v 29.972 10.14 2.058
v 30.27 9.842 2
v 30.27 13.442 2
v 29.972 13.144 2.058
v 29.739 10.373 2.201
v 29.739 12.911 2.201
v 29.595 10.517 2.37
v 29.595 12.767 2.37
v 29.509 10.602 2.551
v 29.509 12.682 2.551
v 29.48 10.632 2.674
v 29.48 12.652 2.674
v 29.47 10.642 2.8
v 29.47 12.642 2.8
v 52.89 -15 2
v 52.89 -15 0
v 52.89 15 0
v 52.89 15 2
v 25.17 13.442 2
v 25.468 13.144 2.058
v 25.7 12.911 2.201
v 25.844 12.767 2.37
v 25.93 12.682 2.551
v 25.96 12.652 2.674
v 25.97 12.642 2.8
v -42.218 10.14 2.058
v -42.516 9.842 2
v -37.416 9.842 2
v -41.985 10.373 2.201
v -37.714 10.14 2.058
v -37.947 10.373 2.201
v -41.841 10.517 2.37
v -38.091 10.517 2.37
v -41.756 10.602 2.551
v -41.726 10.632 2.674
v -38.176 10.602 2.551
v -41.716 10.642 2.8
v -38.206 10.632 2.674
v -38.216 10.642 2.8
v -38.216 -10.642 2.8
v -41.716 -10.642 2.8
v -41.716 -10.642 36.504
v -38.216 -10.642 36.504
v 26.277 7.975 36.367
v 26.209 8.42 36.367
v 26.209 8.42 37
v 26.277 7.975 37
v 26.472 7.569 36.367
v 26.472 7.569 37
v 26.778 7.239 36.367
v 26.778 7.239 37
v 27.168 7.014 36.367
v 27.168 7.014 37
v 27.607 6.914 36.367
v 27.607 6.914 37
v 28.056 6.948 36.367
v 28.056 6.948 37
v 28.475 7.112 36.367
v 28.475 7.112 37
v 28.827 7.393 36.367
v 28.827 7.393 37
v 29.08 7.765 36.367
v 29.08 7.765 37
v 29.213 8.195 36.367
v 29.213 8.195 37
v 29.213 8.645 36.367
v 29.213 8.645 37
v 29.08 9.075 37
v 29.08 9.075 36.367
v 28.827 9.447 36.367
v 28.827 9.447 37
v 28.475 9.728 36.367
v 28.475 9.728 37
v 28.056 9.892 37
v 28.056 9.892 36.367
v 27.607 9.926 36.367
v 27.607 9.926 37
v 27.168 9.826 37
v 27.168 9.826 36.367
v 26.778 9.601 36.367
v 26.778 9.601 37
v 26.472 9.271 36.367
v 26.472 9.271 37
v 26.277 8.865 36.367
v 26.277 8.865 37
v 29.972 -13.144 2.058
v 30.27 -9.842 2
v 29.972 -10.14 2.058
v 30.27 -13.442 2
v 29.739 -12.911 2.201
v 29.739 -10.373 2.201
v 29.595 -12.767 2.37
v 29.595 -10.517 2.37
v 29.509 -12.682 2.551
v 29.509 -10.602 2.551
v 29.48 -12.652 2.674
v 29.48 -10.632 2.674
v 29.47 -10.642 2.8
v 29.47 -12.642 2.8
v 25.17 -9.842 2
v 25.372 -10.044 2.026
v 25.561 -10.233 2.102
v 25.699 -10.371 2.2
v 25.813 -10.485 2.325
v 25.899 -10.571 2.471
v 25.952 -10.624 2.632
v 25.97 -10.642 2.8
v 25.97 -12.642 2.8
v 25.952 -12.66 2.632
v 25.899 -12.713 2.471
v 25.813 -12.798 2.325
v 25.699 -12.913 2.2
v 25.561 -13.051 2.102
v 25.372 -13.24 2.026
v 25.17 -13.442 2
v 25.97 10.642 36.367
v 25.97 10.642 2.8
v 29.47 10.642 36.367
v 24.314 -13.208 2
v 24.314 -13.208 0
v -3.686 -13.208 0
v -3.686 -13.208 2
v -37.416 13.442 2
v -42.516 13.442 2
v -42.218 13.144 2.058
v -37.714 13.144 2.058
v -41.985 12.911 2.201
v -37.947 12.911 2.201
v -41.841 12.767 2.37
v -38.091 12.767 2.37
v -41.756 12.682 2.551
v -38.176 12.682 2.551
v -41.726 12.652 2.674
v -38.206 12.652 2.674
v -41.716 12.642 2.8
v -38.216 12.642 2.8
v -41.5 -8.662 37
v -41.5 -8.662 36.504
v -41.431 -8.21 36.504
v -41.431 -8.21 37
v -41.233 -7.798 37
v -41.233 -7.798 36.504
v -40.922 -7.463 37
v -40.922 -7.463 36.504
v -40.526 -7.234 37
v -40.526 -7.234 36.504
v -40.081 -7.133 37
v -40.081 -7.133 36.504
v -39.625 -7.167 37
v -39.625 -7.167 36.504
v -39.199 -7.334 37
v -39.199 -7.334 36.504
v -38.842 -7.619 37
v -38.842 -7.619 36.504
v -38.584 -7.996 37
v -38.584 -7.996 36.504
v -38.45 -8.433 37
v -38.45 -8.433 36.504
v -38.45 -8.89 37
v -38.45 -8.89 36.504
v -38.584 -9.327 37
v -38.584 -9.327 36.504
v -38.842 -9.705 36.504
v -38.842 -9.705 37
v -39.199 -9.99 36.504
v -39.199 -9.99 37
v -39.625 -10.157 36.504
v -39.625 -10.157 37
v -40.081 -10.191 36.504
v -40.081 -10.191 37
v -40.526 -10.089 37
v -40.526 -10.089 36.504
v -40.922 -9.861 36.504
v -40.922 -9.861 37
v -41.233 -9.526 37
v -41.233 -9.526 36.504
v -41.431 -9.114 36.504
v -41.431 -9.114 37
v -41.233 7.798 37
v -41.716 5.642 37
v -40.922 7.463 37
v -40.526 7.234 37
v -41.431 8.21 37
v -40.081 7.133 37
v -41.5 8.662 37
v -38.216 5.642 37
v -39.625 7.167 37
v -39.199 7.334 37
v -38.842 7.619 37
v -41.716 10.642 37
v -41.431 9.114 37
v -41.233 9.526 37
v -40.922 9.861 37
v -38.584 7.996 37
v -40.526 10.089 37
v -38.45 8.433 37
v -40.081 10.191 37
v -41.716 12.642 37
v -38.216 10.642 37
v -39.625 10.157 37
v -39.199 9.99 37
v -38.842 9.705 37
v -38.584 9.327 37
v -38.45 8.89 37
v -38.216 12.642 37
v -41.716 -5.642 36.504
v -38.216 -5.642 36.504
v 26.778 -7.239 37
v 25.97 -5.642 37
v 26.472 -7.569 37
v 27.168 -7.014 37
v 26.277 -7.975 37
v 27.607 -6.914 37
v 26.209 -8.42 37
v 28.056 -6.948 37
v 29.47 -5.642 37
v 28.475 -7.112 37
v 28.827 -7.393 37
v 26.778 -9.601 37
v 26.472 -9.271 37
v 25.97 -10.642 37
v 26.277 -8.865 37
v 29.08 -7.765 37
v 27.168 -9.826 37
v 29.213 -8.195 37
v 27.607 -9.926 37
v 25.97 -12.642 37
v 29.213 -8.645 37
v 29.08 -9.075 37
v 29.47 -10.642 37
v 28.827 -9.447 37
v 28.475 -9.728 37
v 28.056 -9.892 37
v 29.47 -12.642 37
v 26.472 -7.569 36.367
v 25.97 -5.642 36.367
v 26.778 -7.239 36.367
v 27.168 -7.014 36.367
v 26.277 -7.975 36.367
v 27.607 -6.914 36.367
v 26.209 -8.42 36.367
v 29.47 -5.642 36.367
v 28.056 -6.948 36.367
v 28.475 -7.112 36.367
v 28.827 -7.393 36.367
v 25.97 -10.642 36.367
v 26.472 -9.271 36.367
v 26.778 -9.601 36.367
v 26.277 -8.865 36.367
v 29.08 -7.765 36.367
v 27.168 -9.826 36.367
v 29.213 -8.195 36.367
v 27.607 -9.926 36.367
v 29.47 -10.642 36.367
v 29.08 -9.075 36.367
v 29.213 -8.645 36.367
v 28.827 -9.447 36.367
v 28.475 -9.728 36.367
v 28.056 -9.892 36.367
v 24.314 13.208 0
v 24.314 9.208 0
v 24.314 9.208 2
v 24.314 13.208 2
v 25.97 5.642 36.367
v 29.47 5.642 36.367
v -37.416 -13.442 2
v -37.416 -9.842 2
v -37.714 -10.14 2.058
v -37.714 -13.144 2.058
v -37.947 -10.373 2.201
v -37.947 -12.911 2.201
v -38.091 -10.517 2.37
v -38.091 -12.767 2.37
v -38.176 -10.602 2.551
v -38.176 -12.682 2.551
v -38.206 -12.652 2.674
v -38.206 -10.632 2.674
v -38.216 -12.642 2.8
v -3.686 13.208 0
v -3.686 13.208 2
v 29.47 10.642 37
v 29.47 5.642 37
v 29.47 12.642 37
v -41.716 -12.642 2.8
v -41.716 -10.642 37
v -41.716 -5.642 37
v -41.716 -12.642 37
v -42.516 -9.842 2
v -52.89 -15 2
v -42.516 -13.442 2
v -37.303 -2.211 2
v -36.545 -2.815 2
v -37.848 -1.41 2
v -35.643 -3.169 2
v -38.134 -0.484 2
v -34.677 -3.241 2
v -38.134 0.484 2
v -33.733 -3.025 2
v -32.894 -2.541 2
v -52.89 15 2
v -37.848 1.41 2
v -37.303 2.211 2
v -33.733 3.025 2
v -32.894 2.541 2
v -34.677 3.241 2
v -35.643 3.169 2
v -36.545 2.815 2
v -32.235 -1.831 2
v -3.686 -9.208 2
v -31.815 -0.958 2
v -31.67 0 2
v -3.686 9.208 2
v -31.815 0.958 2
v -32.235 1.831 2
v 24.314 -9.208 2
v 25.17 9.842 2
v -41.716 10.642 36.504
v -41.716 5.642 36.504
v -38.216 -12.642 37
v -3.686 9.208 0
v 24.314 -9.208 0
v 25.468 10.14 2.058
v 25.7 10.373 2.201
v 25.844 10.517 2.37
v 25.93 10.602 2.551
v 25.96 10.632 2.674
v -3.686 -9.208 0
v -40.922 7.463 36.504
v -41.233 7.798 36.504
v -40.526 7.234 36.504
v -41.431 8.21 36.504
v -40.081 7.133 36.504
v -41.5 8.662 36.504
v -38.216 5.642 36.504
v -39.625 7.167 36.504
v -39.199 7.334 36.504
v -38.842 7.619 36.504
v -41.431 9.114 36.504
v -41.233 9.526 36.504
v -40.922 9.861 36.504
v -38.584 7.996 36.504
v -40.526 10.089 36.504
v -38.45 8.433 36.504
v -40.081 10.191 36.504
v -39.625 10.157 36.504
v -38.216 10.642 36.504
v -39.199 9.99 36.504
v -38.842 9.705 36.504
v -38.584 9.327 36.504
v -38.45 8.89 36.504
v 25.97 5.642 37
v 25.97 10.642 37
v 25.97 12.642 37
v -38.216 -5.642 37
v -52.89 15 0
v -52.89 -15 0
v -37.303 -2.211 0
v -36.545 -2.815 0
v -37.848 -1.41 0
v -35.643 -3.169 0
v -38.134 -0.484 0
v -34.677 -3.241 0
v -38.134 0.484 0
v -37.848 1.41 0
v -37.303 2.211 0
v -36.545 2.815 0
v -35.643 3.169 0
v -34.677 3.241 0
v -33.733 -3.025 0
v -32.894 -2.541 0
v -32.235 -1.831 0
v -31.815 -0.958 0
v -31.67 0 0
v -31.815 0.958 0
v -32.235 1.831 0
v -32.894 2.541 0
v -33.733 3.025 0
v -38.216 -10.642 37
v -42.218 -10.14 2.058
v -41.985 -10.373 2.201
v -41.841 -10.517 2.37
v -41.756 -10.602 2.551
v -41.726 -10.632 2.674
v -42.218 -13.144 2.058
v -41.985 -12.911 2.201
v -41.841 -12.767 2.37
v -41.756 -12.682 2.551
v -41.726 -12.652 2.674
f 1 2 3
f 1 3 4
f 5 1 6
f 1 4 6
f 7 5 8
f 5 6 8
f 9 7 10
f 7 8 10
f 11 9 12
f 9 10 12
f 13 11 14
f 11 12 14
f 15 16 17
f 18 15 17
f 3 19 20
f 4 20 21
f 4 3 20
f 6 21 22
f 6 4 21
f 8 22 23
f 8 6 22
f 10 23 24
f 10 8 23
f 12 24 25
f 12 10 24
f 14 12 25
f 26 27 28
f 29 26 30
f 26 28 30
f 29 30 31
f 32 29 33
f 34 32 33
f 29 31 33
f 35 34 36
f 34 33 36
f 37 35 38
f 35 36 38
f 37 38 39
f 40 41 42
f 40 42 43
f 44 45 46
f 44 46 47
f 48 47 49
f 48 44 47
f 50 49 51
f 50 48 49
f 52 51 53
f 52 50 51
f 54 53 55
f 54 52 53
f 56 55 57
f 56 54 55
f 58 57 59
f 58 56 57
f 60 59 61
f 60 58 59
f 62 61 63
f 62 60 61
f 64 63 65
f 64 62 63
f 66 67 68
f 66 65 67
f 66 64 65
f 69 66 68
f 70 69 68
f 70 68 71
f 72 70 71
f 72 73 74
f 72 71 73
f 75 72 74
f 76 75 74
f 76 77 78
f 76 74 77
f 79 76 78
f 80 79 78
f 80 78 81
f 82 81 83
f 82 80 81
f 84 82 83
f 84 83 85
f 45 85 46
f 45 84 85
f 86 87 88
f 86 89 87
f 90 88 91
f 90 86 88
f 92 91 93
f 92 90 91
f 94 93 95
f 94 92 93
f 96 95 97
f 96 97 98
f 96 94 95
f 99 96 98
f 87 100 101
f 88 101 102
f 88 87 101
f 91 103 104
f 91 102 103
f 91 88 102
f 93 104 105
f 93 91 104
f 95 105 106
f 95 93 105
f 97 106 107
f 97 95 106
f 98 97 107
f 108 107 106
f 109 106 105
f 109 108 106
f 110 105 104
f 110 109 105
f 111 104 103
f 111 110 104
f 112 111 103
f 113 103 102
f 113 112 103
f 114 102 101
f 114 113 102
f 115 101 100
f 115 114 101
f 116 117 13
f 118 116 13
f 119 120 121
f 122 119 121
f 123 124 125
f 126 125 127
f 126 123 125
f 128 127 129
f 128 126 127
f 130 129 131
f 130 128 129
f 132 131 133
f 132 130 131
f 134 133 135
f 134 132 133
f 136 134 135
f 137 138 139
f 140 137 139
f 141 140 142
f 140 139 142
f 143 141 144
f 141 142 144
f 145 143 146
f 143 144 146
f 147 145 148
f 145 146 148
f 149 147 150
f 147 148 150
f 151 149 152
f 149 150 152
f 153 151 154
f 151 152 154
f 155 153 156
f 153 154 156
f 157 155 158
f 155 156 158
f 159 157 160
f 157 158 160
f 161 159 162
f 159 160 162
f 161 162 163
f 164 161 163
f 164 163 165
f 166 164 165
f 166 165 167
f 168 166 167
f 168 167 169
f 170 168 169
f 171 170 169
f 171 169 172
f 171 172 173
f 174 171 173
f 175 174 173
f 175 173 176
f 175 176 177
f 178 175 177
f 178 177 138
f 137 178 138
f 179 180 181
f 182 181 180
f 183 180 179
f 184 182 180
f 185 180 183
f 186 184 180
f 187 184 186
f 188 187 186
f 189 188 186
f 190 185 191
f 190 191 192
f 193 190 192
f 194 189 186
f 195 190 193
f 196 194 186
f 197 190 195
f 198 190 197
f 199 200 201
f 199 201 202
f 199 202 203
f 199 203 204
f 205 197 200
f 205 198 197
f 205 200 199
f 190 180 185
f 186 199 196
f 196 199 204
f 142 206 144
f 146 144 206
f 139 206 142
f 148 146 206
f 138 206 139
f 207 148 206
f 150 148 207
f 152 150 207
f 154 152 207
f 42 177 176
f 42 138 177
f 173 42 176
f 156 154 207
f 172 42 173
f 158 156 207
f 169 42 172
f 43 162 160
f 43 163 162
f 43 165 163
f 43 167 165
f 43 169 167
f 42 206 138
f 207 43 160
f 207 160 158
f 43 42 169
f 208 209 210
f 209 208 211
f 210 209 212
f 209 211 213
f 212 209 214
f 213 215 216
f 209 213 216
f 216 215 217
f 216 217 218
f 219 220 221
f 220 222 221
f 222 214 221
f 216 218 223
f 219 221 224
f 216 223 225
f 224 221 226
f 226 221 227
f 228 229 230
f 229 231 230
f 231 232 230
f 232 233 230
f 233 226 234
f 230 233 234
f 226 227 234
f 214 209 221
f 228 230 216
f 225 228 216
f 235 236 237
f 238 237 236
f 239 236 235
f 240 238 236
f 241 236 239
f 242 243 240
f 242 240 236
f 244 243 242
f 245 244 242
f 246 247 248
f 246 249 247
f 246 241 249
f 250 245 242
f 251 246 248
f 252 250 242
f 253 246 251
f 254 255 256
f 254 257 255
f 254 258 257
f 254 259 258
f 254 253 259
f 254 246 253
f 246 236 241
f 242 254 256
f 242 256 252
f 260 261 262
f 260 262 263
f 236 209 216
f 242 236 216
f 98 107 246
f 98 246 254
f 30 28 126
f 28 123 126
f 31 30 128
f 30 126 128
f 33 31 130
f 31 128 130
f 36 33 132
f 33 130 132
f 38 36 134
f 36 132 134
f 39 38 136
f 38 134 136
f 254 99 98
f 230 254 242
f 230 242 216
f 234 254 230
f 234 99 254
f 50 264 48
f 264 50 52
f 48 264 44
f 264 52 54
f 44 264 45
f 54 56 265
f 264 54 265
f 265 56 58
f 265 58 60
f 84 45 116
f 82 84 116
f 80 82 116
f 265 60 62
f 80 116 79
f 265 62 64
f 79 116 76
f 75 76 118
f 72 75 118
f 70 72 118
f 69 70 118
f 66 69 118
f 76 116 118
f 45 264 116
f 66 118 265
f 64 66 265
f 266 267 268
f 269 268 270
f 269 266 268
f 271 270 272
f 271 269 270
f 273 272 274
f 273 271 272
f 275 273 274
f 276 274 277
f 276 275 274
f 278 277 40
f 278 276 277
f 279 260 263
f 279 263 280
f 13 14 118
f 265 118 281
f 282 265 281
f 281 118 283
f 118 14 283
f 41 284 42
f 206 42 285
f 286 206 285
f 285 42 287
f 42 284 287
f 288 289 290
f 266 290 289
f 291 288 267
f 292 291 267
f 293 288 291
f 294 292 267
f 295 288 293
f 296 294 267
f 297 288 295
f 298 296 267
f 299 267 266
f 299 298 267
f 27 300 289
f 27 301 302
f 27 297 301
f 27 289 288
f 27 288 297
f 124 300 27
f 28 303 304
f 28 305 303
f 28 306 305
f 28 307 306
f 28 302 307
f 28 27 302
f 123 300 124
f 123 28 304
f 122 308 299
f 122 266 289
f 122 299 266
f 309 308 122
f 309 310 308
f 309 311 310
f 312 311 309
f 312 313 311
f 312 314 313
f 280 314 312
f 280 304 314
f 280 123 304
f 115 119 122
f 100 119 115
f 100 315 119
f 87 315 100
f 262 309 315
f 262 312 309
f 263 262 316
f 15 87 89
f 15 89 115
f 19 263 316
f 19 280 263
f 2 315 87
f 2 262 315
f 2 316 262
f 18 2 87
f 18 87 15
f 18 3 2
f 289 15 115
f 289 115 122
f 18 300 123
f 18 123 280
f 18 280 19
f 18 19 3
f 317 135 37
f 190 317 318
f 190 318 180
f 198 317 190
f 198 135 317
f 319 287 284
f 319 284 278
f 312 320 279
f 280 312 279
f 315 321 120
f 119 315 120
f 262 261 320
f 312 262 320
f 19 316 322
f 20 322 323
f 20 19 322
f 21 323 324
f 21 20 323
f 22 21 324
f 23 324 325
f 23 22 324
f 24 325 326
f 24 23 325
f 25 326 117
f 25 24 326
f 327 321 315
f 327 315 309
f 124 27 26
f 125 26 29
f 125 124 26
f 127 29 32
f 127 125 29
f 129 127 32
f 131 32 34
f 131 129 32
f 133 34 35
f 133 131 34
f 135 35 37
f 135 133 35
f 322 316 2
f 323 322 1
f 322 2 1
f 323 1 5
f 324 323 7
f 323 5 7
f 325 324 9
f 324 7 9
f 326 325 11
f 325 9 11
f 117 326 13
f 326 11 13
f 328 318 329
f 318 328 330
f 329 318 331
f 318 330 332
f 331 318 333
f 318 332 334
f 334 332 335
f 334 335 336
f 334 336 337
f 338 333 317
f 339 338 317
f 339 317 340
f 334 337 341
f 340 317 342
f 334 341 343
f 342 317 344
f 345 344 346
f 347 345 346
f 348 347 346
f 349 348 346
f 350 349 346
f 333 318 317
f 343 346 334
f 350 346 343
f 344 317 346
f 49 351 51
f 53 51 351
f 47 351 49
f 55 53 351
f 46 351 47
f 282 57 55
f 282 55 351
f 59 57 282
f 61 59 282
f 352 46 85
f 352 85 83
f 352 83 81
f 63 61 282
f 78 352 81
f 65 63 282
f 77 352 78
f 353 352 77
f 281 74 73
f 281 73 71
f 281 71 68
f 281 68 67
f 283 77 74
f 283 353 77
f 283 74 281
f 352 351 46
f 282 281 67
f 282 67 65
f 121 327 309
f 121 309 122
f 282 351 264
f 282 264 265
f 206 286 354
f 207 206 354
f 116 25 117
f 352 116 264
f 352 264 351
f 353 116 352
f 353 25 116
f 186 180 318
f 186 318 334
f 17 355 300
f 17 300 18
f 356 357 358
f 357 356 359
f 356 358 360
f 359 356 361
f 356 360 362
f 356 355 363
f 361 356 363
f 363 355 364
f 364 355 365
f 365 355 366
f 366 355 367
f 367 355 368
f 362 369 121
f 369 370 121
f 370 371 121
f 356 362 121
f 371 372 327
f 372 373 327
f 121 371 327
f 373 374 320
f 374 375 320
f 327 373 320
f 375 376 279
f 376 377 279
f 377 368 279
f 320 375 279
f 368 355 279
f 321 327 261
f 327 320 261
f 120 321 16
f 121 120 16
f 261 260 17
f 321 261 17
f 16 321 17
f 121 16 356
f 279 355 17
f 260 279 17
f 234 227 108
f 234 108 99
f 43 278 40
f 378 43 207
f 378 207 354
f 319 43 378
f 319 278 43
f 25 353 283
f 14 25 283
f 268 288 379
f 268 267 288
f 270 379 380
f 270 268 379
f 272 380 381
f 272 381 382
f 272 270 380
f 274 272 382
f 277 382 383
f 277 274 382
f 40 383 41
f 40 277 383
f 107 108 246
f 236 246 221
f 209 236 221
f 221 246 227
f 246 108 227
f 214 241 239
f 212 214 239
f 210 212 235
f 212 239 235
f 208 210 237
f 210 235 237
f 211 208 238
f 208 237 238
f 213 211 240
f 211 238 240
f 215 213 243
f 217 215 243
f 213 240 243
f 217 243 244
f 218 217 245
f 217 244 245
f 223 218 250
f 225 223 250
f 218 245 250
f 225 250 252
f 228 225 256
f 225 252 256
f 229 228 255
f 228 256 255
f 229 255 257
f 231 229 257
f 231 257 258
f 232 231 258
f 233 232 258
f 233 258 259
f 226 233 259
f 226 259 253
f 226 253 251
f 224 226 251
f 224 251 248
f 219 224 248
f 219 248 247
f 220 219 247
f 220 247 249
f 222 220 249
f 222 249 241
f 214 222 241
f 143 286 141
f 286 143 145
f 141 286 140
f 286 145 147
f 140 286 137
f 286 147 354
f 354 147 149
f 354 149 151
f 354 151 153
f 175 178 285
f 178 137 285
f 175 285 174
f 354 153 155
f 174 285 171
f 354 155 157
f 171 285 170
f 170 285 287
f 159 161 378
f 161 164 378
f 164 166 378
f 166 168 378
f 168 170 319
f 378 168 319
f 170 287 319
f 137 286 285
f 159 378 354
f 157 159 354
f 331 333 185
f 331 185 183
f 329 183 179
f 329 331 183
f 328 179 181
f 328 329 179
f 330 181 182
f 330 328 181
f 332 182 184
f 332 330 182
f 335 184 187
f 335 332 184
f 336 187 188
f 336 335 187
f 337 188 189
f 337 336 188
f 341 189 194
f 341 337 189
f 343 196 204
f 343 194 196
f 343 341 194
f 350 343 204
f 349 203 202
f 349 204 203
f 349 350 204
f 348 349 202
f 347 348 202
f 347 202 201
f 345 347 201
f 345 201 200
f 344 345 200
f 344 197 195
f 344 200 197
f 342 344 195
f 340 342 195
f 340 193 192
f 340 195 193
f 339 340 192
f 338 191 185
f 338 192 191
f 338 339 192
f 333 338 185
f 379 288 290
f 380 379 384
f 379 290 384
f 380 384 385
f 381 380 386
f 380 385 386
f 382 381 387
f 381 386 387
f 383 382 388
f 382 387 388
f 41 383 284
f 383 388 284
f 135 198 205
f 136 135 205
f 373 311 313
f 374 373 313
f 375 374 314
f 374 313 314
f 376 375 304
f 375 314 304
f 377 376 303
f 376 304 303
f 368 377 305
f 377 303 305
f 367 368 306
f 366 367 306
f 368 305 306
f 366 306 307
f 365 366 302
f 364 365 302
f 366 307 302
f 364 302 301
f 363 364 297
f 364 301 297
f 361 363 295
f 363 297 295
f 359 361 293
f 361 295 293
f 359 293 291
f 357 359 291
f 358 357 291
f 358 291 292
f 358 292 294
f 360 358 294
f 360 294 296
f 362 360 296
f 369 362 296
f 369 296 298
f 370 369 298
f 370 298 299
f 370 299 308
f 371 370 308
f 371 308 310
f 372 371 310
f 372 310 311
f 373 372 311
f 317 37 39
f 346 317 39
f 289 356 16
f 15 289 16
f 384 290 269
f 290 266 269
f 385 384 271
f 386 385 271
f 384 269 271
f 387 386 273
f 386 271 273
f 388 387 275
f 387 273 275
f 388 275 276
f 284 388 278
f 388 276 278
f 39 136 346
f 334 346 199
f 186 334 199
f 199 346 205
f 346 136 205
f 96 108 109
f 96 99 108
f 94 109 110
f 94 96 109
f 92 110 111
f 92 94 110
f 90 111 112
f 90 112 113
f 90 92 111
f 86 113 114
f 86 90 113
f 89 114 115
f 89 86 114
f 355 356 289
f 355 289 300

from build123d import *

# Parameters (mm, degrees)
SKETCH1_W           = 105.78
SKETCH1_H           = 30
BOSS_EXTRUDE1_DEPTH = 2
SKETCH5_W           = 3.5
SKETCH5_H           = 2
BOSS_EXTRUDE2_DEPTH = 35
SKETCH6_W           = 3.5
SKETCH6_H           = 2
BOSS_EXTRUDE3_DEPTH = 35
SKETCH7_W           = 3.5
SKETCH7_H           = 0.495515405
BOSS_EXTRUDE4_DEPTH = 5
SKETCH9_W           = 3.5
SKETCH9_H           = 0.633233513
BOSS_EXTRUDE5_DEPTH = 5
SKETCH10_R          = 1.510168907
CUT_EXTRUDE2_DEPTH  = 72
SKETCH11_R          = 1.533572267
CUT_EXTRUDE3_DEPTH  = 42
SKETCH12_R          = 3.25
CUT_EXTRUDE4_DEPTH  = 15
FILLET1_R           = 0.8
SKETCH13_W          = 28.000104313
SKETCH13_H          = 4
CUT_EXTRUDE5_DEPTH  = 10


with BuildPart() as part:
    # Sketch1 → Boss-Extrude1 (new body)
    with BuildSketch(Plane.XY):
        Rectangle(SKETCH1_W, SKETCH1_H)
    extrude(amount=BOSS_EXTRUDE1_DEPTH)

    # Sketch5 → Boss-Extrude2 (add)
    with BuildSketch(Plane.XY.offset(2)):
        with Locations((27.719609025, 11.641851008)):
            Rectangle(SKETCH5_W, SKETCH5_H)
    boss_extrude2 = extrude(amount=BOSS_EXTRUDE2_DEPTH)

    # Sketch6 → Boss-Extrude3 (add)
    with BuildSketch(Plane.XY.offset(2)):
        with Locations((-39.966011677, 11.641851008)):
            Rectangle(SKETCH6_W, SKETCH6_H)
    boss_extrude3 = extrude(amount=BOSS_EXTRUDE3_DEPTH)

    # Sketch7 → Boss-Extrude4 (add)
    with BuildSketch(Plane.XZ.offset(-10.641851008)):
        with Locations((-39.966011677, 36.752242298)):
            Rectangle(SKETCH7_W, SKETCH7_H)
    boss_extrude4 = extrude(amount=BOSS_EXTRUDE4_DEPTH)

    # Sketch9 → Boss-Extrude5 (add)
    with BuildSketch(Plane.XZ.offset(-10.641851008)):
        with Locations((27.719609025, 36.683383244)):
            Rectangle(SKETCH9_W, SKETCH9_H)
    boss_extrude5 = extrude(amount=BOSS_EXTRUDE5_DEPTH)

    # Sketch10 → Cut-Extrude2 (cut)
    with BuildSketch(Plane.XY.offset(2)):
        with Locations(Location((27.719609025, 8.420134131, 0), (0, 0, 180))):
            Circle(SKETCH10_R)
    cut_extrude2 = extrude(amount=CUT_EXTRUDE2_DEPTH, mode=Mode.SUBTRACT)

    # Sketch11 → Cut-Extrude3 (cut)
    with BuildSketch(Plane.XY.offset(2)):
        with Locations(Location((-39.966011677, 8.661839338, 0), (0, 0, 180))):
            Circle(SKETCH11_R)
    cut_extrude3 = extrude(amount=CUT_EXTRUDE3_DEPTH, mode=Mode.SUBTRACT)

    # Mirror2: Boss-Extrude2, Boss-Extrude3, Boss-Extrude4, Boss-Extrude5, Cut-Extrude2, Cut-Extrude3 across plane
    add(boss_extrude2.mirror(Plane.ZX))
    add(boss_extrude3.mirror(Plane.ZX))
    add(boss_extrude4.mirror(Plane.ZX))
    add(boss_extrude5.mirror(Plane.ZX))
    add(cut_extrude2.mirror(Plane.ZX), mode=Mode.SUBTRACT)
    add(cut_extrude3.mirror(Plane.ZX), mode=Mode.SUBTRACT)

    # Sketch12 → Cut-Extrude4 (cut)
    with BuildSketch(Plane.XY.offset(2)):
        with Locations((-34.920285351, 0)):
            Circle(SKETCH12_R)
    extrude(amount=-CUT_EXTRUDE4_DEPTH, mode=Mode.SUBTRACT)

    # Fillet1
    fillet1_edges = [part.edges().sort_by_distance(p)[0] for p in [
        (29.469609025, 11.641851008, 2),
        (27.719609025, 12.641851008, 2),
        (25.969609025, 11.641851008, 2),
        (27.719609025, 10.641851008, 2),
        (-38.216011677, 11.641851008, 2),
        (-39.966011677, 12.641851008, 2),
        (-41.716011677, 11.641851008, 2),
        (-39.966011677, 10.641851008, 2),
        (29.469609025, -11.641851008, 2),
        (27.719609025, -12.641851008, 2),
        (25.969609025, -11.641851008, 2),
        (27.719609025, -10.641851008, 2),
        (-38.216011677, -11.641851008, 2),
        (-39.966011677, -12.641851008, 2),
        (-41.716011677, -11.641851008, 2),
        (-39.966011677, -10.641851008, 2),
    ]]
    fillet(fillet1_edges, radius=FILLET1_R)

    # Sketch13 → Cut-Extrude5 (cut)
    with BuildSketch(Plane(origin=(0, 0, 0), x_dir=(-1, 0, 0), z_dir=(0, 0, -1))):
        with Locations((-10.313745058, 11.208488392)):
            Rectangle(SKETCH13_W, SKETCH13_H)
    cut_extrude5 = extrude(amount=-CUT_EXTRUDE5_DEPTH, mode=Mode.SUBTRACT)

    # Mirror3: Cut-Extrude5 across plane
    add(cut_extrude5.mirror(Plane.ZX), mode=Mode.SUBTRACT)


solid = part.part
